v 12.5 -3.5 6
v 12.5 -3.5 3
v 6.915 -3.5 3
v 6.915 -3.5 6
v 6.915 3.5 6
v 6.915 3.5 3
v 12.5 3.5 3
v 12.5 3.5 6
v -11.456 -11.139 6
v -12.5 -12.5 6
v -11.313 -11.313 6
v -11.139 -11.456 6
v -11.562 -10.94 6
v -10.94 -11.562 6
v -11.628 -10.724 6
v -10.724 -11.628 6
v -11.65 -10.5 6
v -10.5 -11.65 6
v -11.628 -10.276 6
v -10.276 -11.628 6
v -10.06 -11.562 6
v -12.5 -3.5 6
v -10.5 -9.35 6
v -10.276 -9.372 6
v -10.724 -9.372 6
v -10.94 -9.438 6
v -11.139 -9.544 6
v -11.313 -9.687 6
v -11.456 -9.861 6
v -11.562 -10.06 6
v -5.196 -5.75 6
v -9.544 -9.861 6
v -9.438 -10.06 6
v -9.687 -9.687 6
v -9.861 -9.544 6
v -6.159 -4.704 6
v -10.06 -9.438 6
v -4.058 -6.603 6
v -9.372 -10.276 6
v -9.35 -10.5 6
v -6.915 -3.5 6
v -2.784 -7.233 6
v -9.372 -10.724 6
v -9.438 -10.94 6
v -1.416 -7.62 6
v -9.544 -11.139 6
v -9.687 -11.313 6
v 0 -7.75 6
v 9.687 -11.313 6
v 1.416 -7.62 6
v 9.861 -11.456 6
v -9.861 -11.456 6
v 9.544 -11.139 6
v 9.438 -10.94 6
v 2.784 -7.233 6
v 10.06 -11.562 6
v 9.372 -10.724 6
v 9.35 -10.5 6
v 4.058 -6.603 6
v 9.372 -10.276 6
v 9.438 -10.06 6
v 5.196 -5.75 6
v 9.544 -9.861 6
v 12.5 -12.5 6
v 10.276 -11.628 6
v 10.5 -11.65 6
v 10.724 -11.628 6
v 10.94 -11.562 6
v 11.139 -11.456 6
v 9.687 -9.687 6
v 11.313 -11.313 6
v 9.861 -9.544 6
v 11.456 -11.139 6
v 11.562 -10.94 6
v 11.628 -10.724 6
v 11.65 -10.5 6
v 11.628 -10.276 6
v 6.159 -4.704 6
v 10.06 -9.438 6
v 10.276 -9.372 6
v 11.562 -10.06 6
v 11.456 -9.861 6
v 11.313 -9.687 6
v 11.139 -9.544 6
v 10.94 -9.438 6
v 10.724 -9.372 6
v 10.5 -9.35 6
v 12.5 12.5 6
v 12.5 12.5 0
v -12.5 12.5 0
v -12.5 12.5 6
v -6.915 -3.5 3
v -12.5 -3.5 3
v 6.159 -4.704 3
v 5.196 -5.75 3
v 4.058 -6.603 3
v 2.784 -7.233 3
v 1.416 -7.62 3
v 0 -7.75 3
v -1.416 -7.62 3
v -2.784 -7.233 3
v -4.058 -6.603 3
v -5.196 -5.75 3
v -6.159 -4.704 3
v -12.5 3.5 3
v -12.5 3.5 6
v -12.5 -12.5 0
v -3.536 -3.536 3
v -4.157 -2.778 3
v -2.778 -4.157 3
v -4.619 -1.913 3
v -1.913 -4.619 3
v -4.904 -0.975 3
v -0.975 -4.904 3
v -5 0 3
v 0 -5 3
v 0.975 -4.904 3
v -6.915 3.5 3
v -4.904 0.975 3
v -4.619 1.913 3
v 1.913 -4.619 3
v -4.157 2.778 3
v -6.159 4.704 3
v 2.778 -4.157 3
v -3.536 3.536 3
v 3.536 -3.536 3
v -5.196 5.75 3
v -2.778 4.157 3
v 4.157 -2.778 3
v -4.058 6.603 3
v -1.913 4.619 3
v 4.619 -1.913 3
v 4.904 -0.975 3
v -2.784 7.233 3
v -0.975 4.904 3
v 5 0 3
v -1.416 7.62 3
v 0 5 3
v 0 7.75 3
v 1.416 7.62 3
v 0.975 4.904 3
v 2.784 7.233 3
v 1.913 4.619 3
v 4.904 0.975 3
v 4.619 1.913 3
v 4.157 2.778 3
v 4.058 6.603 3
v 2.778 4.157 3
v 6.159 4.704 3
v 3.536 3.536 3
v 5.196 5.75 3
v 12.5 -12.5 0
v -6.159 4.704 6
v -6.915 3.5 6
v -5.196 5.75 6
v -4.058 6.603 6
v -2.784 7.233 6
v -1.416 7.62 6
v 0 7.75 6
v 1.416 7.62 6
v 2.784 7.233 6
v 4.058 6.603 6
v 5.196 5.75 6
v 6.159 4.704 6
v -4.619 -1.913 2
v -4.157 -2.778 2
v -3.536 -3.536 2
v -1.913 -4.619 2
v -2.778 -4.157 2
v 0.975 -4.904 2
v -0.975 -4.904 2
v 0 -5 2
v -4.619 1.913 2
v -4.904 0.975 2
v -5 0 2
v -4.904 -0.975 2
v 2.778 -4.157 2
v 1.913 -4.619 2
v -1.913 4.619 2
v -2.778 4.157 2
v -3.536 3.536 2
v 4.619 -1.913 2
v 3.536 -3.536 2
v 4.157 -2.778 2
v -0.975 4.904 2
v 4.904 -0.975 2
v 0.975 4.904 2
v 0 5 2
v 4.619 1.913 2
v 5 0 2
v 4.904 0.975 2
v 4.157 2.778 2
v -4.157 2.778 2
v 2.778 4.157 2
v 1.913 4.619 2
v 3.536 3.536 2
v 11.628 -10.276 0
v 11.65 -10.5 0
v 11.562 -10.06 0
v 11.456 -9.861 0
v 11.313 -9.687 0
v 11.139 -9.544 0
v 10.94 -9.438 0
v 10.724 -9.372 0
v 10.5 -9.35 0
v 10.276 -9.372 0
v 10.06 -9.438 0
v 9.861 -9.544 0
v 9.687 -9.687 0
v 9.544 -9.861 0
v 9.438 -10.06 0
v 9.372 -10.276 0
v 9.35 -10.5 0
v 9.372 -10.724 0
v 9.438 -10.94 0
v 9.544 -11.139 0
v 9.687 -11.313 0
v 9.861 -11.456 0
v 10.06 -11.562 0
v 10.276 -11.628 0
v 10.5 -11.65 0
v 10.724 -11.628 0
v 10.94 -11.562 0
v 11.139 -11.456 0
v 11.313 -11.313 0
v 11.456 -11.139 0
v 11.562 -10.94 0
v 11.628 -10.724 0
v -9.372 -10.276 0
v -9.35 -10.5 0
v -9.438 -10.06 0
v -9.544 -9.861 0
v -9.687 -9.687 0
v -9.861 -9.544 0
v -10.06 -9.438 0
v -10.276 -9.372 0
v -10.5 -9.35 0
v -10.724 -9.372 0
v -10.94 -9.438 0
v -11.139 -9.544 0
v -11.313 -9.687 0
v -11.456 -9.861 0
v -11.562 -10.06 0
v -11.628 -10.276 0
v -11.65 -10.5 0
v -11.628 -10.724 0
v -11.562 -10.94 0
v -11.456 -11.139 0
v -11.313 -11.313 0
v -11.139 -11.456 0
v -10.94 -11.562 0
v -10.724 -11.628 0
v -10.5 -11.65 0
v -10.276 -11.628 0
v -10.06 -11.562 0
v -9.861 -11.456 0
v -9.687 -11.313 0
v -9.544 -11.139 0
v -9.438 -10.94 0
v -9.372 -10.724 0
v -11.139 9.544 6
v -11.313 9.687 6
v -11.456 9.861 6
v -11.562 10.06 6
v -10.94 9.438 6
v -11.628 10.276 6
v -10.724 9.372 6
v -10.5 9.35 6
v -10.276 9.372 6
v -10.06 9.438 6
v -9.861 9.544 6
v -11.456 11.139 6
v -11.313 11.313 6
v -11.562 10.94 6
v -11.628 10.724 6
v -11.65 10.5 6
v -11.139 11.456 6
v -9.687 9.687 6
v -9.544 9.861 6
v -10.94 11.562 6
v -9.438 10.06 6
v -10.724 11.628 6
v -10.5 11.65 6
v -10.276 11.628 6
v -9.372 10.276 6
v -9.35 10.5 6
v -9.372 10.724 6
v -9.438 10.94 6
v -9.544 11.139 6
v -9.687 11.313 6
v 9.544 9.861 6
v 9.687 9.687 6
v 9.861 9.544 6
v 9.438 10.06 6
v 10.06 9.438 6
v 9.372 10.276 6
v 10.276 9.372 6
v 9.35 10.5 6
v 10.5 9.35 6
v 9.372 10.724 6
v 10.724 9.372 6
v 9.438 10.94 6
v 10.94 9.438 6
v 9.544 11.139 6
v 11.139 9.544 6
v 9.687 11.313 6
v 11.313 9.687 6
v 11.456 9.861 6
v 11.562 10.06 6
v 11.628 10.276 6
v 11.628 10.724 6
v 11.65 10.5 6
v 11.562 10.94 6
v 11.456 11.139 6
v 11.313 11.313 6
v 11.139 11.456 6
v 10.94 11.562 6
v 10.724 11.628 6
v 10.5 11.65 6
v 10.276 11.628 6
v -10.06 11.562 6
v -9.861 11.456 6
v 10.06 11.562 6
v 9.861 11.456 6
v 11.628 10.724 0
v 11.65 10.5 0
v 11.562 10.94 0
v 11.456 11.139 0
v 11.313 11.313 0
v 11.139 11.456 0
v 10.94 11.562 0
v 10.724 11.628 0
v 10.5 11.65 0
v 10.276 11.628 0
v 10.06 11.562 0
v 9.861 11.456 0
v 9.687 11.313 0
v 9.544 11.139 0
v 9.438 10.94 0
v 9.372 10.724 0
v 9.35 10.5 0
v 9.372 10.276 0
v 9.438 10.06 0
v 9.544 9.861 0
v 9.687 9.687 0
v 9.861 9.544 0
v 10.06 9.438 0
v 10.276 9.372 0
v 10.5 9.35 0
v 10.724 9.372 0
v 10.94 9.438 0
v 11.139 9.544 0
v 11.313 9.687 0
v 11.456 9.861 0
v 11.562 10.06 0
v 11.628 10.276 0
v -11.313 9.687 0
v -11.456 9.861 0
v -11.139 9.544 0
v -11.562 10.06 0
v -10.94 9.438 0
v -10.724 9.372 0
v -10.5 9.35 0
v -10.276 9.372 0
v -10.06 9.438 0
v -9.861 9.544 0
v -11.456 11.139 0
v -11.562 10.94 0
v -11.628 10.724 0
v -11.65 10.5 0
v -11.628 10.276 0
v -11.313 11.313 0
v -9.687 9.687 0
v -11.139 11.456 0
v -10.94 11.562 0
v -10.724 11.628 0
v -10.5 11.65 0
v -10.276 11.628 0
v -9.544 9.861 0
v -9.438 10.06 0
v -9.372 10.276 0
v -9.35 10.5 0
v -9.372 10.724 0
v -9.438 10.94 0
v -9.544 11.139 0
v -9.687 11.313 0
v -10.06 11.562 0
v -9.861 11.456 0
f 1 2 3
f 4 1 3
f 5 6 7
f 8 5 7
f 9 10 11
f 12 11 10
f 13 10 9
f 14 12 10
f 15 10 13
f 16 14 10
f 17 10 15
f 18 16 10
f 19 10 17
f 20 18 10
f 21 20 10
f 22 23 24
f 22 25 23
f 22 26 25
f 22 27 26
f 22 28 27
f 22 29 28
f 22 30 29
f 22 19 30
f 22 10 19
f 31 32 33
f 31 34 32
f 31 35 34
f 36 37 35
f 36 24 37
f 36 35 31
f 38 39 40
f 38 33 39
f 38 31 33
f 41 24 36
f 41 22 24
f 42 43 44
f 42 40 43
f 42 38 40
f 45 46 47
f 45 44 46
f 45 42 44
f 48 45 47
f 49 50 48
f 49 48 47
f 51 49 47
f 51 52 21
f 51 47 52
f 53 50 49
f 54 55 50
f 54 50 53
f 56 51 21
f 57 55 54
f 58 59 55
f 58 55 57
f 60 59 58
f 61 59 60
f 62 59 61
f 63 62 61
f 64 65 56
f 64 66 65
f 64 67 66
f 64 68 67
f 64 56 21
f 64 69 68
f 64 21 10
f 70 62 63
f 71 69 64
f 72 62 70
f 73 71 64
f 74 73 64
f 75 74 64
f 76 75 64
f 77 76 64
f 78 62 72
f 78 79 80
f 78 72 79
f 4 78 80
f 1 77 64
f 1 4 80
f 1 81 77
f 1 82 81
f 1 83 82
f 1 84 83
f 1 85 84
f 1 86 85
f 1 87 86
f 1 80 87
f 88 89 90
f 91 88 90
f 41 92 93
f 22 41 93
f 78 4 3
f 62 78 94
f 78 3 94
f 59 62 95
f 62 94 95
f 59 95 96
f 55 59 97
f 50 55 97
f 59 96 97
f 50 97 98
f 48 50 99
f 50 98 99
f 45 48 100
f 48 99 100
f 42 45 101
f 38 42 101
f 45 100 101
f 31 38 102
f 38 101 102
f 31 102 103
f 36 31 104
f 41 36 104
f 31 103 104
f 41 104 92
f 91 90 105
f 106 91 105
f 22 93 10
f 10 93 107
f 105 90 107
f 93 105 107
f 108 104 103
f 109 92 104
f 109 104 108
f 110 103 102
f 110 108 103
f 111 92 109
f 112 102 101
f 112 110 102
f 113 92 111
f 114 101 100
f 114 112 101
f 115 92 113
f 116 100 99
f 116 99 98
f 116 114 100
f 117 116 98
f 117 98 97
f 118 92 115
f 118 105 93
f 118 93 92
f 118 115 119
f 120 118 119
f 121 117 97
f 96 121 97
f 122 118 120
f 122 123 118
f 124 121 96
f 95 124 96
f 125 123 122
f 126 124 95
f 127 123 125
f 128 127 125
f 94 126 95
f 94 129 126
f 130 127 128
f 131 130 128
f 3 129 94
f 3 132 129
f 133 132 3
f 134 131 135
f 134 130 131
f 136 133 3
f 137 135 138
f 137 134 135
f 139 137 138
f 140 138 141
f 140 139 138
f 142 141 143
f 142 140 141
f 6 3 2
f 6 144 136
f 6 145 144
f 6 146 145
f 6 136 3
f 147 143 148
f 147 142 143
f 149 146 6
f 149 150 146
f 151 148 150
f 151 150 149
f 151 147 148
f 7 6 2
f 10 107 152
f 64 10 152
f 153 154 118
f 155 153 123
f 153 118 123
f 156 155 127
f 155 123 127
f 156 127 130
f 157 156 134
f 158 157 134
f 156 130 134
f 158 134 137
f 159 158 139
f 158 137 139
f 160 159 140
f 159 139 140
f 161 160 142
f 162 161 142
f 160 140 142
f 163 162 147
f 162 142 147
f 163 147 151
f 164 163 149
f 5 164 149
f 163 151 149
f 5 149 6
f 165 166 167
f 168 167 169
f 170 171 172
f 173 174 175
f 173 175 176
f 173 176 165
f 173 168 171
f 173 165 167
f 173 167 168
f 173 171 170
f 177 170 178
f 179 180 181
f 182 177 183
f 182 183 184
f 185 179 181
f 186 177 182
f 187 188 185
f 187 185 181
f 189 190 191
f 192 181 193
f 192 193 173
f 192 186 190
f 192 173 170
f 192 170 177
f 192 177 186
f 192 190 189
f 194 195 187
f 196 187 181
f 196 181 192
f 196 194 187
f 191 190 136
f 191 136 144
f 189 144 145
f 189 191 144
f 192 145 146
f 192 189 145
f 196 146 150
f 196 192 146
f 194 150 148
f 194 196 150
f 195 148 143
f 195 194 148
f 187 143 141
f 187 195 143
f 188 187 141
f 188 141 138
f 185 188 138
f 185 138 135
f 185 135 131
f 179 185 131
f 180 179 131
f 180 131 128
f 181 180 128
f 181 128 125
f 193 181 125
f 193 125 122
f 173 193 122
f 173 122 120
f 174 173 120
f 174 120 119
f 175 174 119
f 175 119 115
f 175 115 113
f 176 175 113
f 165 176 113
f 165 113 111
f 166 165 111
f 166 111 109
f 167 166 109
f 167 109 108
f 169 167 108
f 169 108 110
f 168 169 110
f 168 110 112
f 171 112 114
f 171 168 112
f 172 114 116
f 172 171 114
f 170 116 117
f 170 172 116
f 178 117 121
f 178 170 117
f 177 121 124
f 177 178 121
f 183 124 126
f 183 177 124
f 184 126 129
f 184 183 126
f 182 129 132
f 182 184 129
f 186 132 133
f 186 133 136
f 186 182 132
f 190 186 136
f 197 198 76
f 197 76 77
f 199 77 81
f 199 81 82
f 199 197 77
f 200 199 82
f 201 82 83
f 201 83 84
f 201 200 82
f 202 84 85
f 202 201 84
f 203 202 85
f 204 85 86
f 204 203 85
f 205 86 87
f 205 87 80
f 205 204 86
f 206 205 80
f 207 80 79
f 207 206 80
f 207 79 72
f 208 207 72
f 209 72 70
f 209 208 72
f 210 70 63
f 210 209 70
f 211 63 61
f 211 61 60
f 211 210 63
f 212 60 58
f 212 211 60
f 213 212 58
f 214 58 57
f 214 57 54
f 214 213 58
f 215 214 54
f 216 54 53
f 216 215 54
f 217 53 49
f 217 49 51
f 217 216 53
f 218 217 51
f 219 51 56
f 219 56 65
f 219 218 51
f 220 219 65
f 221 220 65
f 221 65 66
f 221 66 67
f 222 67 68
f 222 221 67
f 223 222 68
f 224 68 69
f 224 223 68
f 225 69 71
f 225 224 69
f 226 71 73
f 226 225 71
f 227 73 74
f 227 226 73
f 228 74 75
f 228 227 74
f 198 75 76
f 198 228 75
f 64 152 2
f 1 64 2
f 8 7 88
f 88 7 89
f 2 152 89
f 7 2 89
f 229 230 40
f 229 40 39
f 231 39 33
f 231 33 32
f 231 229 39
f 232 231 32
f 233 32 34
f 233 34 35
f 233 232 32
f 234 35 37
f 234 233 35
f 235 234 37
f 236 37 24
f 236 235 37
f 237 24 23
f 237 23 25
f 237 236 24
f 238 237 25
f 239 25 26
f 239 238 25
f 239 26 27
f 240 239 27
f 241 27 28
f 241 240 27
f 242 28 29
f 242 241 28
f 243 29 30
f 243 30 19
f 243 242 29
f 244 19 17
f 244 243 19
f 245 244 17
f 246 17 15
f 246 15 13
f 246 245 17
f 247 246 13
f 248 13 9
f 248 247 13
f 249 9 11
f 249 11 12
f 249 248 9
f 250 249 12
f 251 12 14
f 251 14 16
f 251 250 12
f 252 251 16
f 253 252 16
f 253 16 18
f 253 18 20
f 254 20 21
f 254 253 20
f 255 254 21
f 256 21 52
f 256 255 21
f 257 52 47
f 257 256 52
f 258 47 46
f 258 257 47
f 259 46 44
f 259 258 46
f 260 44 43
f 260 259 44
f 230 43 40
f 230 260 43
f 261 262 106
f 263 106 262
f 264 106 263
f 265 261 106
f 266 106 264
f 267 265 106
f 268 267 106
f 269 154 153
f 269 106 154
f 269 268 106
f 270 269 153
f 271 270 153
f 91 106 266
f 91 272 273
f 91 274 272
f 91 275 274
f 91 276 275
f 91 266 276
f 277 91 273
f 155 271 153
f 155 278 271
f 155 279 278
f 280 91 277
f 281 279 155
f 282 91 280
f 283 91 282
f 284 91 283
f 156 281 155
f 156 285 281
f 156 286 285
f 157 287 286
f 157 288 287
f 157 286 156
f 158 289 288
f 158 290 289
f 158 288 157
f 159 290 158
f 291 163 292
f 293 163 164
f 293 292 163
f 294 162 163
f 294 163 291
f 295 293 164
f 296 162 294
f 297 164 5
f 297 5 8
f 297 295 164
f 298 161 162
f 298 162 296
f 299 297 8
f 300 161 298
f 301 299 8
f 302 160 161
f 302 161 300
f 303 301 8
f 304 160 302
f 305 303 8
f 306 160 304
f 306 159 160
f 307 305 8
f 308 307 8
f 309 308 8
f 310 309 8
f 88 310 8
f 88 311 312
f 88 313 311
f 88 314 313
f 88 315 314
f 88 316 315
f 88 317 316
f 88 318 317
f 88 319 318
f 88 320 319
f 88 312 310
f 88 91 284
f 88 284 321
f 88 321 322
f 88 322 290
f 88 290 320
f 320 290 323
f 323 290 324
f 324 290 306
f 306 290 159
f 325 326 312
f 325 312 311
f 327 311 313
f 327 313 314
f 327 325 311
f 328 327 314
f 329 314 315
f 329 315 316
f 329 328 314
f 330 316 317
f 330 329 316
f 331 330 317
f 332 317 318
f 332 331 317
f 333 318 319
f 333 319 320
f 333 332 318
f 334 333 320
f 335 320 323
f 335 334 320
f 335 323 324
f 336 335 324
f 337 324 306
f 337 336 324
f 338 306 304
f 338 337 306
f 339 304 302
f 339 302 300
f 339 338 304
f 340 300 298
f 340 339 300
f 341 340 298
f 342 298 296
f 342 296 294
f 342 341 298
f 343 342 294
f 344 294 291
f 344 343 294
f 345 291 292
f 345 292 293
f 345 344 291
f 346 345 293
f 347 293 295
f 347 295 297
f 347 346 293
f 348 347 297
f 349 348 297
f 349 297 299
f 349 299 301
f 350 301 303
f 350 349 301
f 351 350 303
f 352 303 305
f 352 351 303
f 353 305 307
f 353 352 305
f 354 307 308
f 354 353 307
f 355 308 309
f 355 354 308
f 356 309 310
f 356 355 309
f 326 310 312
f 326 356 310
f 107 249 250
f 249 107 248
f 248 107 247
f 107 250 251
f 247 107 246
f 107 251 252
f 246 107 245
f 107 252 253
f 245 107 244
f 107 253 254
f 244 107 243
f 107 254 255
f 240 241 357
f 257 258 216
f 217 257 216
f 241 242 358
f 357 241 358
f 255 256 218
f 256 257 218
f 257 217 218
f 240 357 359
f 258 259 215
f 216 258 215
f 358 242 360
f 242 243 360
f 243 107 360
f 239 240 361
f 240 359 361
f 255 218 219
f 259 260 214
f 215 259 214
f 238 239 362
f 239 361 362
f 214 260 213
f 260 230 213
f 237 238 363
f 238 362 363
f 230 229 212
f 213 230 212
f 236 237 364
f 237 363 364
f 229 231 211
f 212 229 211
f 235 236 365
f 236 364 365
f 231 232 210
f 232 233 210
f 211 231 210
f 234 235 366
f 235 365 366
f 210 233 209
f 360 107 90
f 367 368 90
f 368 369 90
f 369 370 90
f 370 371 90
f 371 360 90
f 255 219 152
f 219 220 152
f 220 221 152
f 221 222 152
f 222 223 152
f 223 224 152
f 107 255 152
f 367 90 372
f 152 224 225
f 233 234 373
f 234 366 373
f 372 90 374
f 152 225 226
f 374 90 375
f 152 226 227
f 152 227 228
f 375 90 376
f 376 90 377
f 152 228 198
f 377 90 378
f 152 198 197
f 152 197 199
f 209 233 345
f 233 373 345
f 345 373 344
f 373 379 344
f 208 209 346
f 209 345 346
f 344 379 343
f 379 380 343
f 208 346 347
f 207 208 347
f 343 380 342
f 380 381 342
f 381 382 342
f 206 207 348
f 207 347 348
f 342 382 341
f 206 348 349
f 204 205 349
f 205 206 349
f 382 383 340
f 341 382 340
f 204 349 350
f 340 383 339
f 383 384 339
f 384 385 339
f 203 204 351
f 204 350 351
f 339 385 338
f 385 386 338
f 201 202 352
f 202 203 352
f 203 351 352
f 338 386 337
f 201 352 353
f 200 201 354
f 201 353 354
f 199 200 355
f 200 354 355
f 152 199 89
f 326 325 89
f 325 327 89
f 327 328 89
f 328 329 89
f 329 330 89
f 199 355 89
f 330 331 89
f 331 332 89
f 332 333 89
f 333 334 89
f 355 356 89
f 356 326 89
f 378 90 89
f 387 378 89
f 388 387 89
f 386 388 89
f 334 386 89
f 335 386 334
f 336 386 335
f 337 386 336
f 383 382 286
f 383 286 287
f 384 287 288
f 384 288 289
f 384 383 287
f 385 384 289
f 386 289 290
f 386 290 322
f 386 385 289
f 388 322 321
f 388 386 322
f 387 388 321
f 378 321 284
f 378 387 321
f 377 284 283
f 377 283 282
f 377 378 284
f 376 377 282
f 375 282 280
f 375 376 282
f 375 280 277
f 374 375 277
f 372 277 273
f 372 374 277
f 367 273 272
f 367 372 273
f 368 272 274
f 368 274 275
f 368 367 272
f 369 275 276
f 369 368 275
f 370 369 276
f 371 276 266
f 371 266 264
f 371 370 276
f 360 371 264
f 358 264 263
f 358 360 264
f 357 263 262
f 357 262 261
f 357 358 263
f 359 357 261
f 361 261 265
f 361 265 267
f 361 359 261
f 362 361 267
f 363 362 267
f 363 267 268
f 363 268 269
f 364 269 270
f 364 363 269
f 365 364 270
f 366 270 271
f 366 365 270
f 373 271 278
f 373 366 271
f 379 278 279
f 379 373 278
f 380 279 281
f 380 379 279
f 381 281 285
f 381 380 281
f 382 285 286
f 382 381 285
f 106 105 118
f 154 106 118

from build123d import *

# Parameters (mm, degrees)
F0_R     = 5
F1_DEPTH = 3
F0_R_2   = 1.15
F2_DEPTH = 6
F3_DEPTH = 2


with BuildPart() as f1:
    # F0 (on Top) → F1 (new body)
    with BuildSketch(Plane.XY):
        with BuildLine():
            ThreePointArc((6.914658, -3.5), (7.538272, -1.799152), (7.75, 0))
            ThreePointArc((7.75, 0), (7.538272, 1.799152), (6.914658, 3.5))
            ThreePointArc((6.914658, 3.5), (0, 7.75), (-6.914658, 3.5))
            ThreePointArc((-6.914658, 3.5), (-7.75, 0), (-6.914658, -3.5))
            ThreePointArc((-6.914658, -3.5), (0, -7.75), (6.914658, -3.5))
        make_face()
        Circle(F0_R, mode=Mode.SUBTRACT)
        with BuildLine():
            ThreePointArc((-6.914658, -3.5), (-7.75, 0), (-6.914658, 3.5))
            Line((-6.914658, 3.5), (-12.5, 3.5))
            Line((-12.5, 3.5), (-12.5, -3.5))
            Line((-12.5, -3.5), (-6.914658, -3.5))
        make_face()
        with BuildLine():
            ThreePointArc((6.914658, 3.5), (7.538272, 1.799152), (7.75, 0))
            ThreePointArc((7.75, 0), (7.538272, -1.799152), (6.914658, -3.5))
            Line((6.914658, -3.5), (12.5, -3.5))
            Line((12.5, -3.5), (12.5, 3.5))
            Line((12.5, 3.5), (6.914658, 3.5))
        make_face()
    extrude(amount=F1_DEPTH)

    # F0 (on Top) → F2 (join)
    with BuildSketch(Plane.XY):
        with BuildLine():
            ThreePointArc((-6.914658, 3.5), (0, 7.75), (6.914658, 3.5))
            Line((6.914658, 3.5), (12.5, 3.5))
            Line((12.5, 3.5), (12.5, 12.5))
            Line((12.5, 12.5), (-12.5, 12.5))
            Line((-12.5, 12.5), (-12.5, 3.5))
            Line((-12.5, 3.5), (-6.914658, 3.5))
        make_face()
        with Locations((-10.5, 10.5)):
            Circle(F0_R_2, mode=Mode.SUBTRACT)
        with Locations((10.5, 10.5)):
            Circle(F0_R_2, mode=Mode.SUBTRACT)
        with BuildLine():
            Line((12.5, -3.5), (6.914658, -3.5))
            ThreePointArc((6.914658, -3.5), (0, -7.75), (-6.914658, -3.5))
            Line((-6.914658, -3.5), (-12.5, -3.5))
            Line((-12.5, -3.5), (-12.5, -12.5))
            Line((-12.5, -12.5), (12.5, -12.5))
            Line((12.5, -12.5), (12.5, -3.5))
        make_face()
        with Locations((-10.5, -10.5)):
            Circle(F0_R_2, mode=Mode.SUBTRACT)
        with Locations((10.5, -10.5)):
            Circle(F0_R_2, mode=Mode.SUBTRACT)
    extrude(amount=F2_DEPTH)

    # F0 (on Top) → F3 (join)
    with BuildSketch(Plane.XY):
        Circle(F0_R)
    extrude(amount=F3_DEPTH)


solid = f1.part
